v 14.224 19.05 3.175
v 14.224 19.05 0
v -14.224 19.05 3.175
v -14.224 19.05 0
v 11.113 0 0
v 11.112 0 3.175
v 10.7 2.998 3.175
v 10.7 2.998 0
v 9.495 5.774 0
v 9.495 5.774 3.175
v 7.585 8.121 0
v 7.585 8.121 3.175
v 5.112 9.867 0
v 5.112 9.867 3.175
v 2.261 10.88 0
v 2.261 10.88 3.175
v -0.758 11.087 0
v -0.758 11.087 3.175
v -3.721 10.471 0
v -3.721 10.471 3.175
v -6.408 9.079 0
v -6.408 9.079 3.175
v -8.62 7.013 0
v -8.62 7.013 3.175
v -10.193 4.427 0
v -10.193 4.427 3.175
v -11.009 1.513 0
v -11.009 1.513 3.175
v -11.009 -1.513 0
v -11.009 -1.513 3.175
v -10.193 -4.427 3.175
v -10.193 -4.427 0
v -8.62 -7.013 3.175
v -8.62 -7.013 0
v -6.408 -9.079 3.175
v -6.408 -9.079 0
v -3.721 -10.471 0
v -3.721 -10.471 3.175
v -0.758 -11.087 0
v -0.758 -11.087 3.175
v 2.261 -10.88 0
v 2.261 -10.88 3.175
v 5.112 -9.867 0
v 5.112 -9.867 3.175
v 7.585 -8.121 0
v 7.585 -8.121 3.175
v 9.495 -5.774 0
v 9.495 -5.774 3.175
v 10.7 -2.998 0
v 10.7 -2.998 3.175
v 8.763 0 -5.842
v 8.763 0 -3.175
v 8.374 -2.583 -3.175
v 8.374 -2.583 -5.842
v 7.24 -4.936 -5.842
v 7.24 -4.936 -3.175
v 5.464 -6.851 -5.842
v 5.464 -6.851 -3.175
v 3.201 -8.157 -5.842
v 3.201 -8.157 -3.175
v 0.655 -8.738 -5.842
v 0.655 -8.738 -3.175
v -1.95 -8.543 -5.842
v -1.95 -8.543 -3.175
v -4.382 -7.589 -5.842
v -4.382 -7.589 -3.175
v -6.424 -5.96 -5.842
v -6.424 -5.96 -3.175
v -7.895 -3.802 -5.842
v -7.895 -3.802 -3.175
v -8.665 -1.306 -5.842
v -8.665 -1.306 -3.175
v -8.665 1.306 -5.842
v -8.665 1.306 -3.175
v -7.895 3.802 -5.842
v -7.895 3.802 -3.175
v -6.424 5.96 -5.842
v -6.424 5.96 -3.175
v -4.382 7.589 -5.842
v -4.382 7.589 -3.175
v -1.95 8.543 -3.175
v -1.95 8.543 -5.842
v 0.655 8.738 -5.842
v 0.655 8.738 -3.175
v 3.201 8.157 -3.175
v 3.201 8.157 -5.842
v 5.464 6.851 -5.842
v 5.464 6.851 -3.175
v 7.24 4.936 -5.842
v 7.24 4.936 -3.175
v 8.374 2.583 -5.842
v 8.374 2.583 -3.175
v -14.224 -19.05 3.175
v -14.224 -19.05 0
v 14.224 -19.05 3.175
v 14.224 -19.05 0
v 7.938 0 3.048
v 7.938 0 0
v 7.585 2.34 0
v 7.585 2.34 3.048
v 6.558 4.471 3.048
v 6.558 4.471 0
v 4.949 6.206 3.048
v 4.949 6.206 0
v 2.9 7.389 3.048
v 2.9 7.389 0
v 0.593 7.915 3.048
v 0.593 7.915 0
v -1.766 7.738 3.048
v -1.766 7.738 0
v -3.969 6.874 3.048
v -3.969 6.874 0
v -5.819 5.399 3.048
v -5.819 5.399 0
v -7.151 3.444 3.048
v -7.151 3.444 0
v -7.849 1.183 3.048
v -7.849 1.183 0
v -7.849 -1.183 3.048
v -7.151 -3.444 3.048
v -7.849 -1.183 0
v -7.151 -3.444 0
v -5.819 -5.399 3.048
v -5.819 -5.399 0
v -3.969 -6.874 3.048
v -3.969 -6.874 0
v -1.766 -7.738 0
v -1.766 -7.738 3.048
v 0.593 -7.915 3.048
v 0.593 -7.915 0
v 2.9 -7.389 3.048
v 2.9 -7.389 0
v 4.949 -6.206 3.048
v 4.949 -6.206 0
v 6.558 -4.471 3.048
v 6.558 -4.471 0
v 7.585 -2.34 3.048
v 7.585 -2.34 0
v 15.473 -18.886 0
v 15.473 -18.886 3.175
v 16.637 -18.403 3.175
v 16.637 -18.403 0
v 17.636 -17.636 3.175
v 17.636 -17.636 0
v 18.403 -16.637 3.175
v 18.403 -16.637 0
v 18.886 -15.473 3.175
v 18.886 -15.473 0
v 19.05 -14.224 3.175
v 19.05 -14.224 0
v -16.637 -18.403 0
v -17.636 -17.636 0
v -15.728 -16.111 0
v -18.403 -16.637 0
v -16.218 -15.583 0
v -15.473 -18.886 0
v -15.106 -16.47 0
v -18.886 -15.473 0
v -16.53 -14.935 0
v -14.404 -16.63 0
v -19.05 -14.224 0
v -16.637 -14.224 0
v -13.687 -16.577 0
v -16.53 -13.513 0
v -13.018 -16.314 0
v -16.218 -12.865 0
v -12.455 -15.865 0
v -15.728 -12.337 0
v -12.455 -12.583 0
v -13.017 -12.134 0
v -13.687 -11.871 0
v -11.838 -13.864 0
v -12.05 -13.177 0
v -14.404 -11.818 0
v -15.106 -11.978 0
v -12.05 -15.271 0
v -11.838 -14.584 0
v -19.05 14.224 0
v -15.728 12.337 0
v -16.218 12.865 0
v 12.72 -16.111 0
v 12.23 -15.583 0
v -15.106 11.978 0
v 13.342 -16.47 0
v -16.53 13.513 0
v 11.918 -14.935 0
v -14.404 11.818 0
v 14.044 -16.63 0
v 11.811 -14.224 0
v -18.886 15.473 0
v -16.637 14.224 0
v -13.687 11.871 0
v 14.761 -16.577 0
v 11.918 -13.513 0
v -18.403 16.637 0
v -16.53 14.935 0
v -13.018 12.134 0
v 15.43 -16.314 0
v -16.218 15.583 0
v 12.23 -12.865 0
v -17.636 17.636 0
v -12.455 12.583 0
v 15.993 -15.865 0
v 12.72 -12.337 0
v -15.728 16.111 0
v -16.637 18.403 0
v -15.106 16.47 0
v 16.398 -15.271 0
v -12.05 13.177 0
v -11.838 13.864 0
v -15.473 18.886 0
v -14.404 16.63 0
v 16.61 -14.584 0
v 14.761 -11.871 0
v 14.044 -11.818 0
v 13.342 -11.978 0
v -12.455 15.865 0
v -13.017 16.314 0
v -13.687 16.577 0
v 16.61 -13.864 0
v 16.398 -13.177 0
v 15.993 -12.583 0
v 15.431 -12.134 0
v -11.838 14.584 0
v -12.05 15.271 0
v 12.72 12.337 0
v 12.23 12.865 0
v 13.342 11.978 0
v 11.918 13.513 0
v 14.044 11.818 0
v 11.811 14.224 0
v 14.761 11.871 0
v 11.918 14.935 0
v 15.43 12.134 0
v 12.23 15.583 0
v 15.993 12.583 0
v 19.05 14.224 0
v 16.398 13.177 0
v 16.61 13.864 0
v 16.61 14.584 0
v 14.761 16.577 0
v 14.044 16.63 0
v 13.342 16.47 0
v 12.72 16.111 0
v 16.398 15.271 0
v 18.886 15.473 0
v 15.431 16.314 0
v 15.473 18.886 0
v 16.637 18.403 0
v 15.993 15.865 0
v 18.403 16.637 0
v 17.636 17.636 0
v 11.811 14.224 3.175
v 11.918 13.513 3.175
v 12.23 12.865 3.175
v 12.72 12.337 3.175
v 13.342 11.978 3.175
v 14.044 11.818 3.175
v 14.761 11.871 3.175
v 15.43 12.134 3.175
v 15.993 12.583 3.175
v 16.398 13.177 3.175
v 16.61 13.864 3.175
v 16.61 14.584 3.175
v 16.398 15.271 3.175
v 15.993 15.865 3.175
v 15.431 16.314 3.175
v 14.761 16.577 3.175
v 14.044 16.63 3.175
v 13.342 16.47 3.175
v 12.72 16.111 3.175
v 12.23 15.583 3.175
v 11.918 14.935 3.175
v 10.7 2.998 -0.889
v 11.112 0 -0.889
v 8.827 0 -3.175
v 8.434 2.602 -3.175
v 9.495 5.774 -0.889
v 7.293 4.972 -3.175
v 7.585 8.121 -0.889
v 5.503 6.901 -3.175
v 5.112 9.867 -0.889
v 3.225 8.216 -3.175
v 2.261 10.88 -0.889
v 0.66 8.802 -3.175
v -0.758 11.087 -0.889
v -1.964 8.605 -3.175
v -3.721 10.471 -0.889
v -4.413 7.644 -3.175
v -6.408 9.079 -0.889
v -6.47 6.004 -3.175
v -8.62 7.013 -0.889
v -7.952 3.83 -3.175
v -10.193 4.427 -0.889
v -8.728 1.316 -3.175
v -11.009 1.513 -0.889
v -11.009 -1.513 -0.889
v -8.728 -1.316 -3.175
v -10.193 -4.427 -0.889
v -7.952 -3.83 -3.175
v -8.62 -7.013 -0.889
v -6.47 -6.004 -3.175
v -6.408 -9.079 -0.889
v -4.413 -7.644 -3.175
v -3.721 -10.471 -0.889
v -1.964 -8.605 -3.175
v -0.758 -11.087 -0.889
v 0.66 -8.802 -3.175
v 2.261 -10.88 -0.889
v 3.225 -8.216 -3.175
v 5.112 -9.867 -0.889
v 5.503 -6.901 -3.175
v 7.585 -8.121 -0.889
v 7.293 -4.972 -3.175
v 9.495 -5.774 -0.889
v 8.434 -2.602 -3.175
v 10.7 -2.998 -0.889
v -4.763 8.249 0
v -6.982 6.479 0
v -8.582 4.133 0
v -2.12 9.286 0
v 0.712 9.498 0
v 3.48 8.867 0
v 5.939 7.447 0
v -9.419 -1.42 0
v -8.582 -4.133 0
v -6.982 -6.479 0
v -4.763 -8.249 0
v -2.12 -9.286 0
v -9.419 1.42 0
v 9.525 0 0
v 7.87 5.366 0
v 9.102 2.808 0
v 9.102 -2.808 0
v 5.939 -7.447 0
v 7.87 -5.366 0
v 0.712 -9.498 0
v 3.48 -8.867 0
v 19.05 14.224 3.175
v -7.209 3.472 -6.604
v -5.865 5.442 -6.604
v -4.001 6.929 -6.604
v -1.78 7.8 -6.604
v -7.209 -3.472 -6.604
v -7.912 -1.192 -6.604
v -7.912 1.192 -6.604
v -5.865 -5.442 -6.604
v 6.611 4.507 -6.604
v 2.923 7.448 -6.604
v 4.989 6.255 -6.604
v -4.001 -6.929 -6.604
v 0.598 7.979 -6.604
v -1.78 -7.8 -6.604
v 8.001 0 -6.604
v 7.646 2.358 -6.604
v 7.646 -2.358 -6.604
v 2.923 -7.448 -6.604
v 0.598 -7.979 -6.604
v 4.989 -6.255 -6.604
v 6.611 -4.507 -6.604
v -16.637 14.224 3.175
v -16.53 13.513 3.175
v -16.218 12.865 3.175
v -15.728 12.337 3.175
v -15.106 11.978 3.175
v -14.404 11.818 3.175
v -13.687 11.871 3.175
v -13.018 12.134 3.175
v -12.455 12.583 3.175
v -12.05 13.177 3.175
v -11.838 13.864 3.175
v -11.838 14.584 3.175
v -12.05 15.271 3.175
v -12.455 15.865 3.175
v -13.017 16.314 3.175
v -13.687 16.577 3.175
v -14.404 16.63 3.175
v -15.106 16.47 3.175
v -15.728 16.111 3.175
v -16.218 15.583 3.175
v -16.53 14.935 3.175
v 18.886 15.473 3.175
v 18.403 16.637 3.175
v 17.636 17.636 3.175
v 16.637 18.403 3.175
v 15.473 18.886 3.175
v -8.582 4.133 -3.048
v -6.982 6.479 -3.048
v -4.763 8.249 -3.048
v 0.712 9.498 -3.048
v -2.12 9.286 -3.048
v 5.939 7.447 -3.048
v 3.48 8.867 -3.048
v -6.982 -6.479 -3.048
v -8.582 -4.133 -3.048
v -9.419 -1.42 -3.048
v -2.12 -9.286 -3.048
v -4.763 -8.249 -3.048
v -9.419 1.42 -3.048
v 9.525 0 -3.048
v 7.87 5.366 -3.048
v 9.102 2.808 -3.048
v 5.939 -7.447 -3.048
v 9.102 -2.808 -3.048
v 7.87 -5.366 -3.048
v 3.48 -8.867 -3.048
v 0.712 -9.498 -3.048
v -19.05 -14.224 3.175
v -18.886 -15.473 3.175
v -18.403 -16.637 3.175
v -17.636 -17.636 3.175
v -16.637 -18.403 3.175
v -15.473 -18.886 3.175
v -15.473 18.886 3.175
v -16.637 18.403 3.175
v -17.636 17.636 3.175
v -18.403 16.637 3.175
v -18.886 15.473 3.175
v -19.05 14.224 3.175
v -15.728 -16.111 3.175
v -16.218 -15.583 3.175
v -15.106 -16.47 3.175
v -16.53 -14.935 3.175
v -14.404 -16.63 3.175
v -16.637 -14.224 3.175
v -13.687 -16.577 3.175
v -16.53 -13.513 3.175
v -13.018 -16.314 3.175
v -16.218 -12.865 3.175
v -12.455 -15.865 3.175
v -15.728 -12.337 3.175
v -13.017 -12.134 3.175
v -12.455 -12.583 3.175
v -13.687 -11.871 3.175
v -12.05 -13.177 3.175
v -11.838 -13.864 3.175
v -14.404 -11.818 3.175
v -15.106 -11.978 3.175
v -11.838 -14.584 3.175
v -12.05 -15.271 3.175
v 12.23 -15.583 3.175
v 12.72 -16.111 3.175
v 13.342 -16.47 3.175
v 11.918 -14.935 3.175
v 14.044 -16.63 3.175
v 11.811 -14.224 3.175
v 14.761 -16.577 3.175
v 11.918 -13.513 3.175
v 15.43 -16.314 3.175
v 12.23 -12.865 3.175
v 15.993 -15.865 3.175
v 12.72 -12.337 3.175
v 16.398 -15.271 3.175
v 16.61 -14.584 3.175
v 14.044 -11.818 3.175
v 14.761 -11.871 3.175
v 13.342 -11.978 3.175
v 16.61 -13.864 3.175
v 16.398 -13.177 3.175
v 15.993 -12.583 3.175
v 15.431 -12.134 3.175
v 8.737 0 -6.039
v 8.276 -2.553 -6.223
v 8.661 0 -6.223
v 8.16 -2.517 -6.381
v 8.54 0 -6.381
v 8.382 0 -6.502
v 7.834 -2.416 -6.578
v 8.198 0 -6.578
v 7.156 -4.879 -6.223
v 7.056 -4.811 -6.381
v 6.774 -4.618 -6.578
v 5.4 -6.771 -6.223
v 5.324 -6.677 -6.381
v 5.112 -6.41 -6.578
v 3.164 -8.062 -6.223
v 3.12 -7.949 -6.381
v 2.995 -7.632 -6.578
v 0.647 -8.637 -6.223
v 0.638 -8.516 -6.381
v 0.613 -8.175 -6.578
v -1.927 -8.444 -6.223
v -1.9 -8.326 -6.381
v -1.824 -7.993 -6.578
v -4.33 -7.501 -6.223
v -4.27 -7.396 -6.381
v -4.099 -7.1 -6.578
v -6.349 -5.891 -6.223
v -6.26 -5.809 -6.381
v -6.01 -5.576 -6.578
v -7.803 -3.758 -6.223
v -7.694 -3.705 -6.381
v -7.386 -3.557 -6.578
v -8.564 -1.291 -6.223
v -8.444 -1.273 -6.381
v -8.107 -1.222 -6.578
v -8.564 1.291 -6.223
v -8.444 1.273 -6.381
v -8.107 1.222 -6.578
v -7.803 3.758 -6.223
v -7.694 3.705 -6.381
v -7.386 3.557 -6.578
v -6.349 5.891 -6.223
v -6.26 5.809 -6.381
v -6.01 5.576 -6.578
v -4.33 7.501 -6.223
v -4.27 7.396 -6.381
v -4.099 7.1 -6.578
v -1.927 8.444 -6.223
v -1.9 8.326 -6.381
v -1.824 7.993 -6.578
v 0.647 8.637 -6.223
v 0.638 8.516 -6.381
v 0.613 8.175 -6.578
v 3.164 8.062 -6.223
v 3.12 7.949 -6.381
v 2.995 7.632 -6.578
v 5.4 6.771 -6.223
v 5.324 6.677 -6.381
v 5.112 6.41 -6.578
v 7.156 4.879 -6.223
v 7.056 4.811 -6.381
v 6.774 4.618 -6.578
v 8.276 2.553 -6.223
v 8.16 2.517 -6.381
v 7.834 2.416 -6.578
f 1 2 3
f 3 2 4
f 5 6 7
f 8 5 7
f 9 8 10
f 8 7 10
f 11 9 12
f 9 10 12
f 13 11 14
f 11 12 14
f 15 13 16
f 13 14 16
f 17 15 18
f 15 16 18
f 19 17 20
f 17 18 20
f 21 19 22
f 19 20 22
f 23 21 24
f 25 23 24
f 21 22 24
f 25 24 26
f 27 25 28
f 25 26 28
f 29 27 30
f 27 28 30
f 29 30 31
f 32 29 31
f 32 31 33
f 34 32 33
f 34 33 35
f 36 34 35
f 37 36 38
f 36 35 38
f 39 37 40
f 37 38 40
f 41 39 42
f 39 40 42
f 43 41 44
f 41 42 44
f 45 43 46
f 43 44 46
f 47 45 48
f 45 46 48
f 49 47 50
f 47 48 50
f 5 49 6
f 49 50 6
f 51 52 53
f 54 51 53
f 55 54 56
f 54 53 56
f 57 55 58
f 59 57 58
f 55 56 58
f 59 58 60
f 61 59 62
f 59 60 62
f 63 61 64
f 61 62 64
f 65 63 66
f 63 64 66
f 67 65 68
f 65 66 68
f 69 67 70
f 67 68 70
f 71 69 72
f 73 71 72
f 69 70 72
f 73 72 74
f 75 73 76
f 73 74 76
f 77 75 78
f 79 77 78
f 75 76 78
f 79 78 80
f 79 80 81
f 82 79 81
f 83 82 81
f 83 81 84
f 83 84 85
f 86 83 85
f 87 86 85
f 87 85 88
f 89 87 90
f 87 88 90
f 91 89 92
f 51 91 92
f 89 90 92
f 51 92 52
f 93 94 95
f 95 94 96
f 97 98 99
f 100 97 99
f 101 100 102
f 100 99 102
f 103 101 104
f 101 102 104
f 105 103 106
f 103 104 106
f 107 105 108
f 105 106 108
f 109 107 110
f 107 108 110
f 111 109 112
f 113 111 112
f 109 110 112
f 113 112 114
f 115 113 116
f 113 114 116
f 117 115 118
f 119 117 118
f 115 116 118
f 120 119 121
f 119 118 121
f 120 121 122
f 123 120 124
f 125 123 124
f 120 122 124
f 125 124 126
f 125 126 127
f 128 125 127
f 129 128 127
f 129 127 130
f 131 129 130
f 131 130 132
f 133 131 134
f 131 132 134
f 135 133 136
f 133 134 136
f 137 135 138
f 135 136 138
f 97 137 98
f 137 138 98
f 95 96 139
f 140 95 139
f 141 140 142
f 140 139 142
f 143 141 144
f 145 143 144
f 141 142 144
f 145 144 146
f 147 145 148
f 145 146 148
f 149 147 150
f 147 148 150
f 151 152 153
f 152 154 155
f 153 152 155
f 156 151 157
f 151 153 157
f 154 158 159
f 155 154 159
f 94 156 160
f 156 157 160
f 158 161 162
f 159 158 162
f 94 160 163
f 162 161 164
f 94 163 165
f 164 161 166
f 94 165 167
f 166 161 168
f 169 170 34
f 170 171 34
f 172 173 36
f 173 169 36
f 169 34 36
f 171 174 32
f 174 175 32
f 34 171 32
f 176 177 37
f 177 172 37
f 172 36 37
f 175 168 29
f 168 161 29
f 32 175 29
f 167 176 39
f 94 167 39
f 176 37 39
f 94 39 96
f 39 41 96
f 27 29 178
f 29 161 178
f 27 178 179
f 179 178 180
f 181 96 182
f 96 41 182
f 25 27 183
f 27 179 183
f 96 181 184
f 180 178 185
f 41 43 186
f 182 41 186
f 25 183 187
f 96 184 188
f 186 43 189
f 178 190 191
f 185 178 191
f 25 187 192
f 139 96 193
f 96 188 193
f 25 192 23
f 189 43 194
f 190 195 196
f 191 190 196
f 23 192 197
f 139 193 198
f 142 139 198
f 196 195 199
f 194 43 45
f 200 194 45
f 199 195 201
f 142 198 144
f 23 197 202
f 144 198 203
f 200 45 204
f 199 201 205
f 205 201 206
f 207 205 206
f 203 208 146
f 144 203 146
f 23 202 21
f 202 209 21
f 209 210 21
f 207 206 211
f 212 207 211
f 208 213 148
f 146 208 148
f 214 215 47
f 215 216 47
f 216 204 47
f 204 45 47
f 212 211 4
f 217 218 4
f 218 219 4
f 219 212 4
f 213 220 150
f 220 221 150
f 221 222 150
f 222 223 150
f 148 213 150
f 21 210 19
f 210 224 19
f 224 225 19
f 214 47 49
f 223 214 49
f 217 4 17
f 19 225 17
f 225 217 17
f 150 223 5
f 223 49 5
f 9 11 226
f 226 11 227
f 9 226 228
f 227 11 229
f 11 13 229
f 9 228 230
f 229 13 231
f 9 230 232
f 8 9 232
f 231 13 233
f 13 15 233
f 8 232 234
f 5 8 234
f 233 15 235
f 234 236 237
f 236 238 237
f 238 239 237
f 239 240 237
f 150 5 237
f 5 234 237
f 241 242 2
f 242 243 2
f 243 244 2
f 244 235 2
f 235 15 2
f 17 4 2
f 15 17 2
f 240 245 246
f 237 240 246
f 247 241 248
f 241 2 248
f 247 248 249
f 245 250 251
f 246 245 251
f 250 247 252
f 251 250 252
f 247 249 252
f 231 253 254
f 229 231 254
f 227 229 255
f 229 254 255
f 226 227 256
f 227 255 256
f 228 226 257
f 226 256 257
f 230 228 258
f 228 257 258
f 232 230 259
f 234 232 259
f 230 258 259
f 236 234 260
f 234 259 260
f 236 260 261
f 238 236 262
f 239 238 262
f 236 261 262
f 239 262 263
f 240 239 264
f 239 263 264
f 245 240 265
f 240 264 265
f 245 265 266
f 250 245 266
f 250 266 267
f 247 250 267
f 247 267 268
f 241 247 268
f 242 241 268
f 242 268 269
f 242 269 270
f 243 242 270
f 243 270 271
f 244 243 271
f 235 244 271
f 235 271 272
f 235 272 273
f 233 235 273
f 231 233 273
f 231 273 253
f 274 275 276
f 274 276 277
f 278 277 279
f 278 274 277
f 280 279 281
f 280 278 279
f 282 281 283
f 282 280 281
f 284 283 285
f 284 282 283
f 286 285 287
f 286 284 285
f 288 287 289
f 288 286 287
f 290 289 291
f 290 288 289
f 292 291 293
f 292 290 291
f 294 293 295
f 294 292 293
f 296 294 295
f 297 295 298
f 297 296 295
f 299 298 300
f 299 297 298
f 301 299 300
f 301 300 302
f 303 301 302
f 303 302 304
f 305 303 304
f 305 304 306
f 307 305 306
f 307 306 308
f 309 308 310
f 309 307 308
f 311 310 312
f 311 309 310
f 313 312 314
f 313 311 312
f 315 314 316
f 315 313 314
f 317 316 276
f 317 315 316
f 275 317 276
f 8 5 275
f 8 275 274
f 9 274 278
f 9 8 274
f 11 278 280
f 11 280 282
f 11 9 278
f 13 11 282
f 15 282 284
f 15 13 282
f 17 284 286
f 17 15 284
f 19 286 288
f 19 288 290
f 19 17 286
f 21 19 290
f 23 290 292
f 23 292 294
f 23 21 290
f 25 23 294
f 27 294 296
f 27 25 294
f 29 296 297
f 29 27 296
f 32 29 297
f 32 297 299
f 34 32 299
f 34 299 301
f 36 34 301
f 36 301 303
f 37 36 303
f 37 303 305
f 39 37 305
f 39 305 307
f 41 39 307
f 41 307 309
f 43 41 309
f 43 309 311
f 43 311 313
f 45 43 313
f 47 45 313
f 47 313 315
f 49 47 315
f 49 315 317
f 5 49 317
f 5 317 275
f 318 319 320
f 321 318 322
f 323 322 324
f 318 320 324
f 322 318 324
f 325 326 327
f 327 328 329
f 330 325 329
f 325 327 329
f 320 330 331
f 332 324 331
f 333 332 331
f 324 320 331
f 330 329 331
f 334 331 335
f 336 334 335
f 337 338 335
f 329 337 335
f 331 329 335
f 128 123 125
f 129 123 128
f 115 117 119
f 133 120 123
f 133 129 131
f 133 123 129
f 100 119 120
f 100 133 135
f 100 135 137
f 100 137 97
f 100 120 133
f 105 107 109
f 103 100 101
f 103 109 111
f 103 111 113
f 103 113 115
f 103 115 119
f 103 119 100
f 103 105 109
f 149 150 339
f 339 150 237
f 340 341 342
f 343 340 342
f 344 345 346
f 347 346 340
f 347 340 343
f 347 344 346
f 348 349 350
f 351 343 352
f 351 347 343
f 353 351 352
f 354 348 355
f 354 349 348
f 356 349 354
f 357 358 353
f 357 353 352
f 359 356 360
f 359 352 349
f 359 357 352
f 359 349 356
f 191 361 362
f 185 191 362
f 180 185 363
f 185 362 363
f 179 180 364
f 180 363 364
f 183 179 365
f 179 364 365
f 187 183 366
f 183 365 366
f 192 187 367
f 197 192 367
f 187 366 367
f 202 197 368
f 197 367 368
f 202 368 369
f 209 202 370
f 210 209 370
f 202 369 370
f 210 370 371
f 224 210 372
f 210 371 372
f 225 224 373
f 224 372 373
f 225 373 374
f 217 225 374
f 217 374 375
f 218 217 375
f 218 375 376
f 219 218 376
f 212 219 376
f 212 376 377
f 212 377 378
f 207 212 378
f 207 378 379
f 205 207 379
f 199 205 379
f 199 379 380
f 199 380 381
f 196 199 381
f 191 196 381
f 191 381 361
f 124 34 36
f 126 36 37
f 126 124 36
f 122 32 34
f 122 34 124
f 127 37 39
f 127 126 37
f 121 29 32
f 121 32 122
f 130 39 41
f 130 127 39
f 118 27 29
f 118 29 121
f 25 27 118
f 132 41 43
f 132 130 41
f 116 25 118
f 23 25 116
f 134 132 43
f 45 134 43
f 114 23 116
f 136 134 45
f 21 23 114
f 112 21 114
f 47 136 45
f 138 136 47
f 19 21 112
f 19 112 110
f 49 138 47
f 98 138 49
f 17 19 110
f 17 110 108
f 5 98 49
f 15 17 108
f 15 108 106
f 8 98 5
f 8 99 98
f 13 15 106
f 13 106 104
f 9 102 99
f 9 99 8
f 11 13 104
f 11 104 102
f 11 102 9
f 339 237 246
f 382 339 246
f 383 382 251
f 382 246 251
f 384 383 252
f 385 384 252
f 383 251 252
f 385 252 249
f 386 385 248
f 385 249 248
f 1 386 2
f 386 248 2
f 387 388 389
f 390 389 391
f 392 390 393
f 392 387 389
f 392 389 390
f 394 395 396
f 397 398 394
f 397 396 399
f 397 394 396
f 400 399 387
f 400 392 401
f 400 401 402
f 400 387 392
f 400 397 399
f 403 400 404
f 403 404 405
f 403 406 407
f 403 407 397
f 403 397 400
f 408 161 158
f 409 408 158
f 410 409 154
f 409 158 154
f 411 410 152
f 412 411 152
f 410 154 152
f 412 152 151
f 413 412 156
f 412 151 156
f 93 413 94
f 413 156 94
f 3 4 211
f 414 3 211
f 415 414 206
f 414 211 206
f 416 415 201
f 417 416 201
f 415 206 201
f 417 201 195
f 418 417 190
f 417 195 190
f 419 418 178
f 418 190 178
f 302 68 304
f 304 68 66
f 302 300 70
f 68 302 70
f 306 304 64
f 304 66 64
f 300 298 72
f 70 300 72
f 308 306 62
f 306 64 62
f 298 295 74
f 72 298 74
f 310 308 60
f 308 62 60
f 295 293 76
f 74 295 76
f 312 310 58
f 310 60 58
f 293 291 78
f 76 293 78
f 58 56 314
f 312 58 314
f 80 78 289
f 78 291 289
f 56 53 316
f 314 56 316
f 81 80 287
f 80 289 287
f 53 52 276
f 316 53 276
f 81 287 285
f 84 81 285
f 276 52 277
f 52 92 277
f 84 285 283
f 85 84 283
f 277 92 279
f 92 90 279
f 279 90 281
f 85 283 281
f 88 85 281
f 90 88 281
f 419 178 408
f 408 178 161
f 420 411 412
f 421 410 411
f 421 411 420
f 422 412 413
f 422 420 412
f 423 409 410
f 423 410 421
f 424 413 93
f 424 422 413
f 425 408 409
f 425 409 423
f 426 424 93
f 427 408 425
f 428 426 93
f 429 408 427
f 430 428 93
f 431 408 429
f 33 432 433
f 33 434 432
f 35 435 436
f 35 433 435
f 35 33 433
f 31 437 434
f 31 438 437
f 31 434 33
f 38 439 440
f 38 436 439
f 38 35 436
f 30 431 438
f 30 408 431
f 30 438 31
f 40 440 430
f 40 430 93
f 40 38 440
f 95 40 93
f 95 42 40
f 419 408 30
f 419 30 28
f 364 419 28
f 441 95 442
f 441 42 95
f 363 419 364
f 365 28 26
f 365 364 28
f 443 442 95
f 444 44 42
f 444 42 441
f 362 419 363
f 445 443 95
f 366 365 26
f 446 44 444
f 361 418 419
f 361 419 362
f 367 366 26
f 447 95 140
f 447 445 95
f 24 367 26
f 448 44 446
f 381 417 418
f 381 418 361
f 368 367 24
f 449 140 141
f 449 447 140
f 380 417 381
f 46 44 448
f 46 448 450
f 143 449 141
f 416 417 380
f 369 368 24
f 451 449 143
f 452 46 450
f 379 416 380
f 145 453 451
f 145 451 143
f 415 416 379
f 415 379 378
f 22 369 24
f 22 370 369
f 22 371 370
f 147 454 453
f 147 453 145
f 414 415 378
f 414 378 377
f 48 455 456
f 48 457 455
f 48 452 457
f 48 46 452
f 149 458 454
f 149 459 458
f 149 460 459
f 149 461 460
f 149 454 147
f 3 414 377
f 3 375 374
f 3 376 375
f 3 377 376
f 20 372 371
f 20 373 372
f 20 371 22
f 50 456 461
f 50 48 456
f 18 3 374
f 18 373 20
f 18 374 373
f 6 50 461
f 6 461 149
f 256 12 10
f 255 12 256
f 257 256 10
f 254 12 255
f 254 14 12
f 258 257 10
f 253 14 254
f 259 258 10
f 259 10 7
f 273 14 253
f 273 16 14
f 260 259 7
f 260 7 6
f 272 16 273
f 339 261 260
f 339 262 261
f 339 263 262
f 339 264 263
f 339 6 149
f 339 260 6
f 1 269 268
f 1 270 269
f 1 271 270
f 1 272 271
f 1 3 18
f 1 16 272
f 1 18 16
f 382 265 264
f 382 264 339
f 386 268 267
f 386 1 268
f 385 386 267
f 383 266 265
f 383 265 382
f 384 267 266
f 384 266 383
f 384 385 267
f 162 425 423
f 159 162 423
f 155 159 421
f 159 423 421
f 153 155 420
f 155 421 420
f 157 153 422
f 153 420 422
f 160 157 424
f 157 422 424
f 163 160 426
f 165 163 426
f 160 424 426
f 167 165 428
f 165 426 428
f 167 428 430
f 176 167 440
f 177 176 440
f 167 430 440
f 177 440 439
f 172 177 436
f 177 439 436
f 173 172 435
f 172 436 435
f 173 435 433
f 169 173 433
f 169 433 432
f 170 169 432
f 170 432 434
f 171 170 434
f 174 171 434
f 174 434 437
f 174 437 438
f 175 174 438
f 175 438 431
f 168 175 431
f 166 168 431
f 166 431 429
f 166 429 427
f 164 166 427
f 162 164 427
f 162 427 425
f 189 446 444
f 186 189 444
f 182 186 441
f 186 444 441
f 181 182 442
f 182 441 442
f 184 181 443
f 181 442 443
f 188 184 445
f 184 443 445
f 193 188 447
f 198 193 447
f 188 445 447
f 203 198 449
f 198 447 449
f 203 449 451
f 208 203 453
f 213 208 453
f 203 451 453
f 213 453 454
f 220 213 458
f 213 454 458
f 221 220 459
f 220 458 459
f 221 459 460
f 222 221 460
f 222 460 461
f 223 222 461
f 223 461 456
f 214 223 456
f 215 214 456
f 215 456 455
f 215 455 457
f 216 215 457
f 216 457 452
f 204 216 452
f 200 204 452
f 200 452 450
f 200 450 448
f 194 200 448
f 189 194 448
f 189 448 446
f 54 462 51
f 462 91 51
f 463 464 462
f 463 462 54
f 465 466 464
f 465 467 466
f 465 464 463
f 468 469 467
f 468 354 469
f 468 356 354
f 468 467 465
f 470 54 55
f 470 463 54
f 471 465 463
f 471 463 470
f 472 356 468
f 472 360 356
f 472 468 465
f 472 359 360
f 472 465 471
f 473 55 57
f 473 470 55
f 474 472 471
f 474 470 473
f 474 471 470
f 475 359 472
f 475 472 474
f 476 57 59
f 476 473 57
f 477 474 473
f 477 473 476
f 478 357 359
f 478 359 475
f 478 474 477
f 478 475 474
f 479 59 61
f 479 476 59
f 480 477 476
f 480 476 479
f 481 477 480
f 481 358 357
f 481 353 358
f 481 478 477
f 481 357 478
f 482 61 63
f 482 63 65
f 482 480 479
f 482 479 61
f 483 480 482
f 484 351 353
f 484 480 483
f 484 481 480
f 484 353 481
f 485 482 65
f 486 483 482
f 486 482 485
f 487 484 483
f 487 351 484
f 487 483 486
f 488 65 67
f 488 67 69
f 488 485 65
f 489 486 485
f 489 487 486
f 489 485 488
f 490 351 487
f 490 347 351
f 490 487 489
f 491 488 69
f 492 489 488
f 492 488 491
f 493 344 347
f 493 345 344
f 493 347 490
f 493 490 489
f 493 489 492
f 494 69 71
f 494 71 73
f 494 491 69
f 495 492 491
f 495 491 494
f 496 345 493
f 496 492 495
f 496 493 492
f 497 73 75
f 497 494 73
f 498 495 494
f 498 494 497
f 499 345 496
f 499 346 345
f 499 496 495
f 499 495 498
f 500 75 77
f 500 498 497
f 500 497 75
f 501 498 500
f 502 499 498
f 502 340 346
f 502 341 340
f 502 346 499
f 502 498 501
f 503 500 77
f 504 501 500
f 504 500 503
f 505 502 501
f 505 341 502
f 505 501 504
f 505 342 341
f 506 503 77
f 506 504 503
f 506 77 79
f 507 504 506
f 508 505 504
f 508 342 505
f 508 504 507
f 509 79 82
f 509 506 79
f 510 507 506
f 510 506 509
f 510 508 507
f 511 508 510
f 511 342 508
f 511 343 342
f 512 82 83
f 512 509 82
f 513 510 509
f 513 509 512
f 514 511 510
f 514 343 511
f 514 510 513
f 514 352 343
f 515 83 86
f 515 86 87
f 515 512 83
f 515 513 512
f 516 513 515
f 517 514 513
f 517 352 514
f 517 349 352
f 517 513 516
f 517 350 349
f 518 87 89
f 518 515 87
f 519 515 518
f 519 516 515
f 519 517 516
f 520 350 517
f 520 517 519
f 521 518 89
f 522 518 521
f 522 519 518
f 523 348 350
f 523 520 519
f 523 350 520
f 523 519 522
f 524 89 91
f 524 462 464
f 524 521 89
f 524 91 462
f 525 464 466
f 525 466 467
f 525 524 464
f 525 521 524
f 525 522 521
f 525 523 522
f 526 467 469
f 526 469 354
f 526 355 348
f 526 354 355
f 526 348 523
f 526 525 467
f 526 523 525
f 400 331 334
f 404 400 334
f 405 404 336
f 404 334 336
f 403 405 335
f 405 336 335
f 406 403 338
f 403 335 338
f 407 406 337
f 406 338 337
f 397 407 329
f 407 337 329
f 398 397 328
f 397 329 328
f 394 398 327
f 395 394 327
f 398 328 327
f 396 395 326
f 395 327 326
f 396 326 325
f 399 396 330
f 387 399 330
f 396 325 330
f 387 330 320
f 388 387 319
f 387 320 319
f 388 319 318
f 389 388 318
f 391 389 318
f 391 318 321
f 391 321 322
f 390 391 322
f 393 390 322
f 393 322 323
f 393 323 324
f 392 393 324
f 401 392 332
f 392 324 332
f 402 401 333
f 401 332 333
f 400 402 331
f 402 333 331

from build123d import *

# Parameters (mm, degrees)
F1_DEPTH  = 3.175
F2_R      = 11.1125
F3_DEPTH  = 6.35
F4_R      = 11.1125
F5_DEPTH  = 3.175
F6_R      = 9.525
F7_DEPTH  = 3.048
F8_R      = 7.9375
F9_DEPTH  = 3.048
F10_R     = 8.763
F11_DEPTH = 3.429
F12_R     = 0.762
F13_SIZE  = 2.286
F14_D     = 4.826


with BuildPart() as f1:
    # F0 (on Top) → F1 (new body)
    with BuildSketch(Plane.XY):
        with BuildLine():
            ThreePointArc((19.05, 14.224), (17.636497326, 17.636497326), (14.224, 19.05))
            Line((14.224, 19.05), (9.398, 19.05))
            Line((9.398, 19.05), (-14.224, 19.05))
            ThreePointArc((-14.224, 19.05), (-17.636497326, 17.636497326), (-19.05, 14.224))
            Line((-19.05, 14.224), (-19.05, 9.398))
            Line((-19.05, 9.398), (-19.05, -14.224))
            ThreePointArc((-19.05, -14.224), (-17.636497326, -17.636497326), (-14.224, -19.05))
            Line((-14.224, -19.05), (-9.398, -19.05))
            Line((-9.398, -19.05), (9.398, -19.05))
            Line((9.398, -19.05), (14.224, -19.05))
            ThreePointArc((14.224, -19.05), (17.636497326, -17.636497326), (19.05, -14.224))
            Line((19.05, -14.224), (19.05, 14.224))
        make_face()
    extrude(amount=F1_DEPTH)

    # F2 (on face) → F3 (join)
    with BuildSketch(Plane.XY.offset(3.175)):
        Circle(F2_R)
    extrude(amount=-F3_DEPTH)

    # F4 (on face) → F5 (cut)
    with BuildSketch(Plane.XY.offset(3.175)):
        Circle(F4_R)
    extrude(amount=-F5_DEPTH, mode=Mode.SUBTRACT)

    # F8 (on face) → F9 (join)
    with BuildSketch(Plane.XY):
        Circle(F8_R)
    extrude(amount=F9_DEPTH)

    # F10 (on face) → F11 (join)
    with BuildSketch(Plane(origin=(0, 0, -3.175), x_dir=(1, 0, 0), z_dir=(0, 0, -1))):
        Circle(F10_R)
    extrude(amount=F11_DEPTH)

    # F12
    f12_edges = [f1.edges().sort_by_distance(p)[0] for p in [
        (-8.763, 0, -6.604),
    ]]
    fillet(f12_edges, radius=F12_R)

    # F13
    f13_edges = [f1.edges().sort_by_distance(p)[0] for p in [
        (-11.1125, 0, -3.175),
    ]]
    chamfer(f13_edges, length=F13_SIZE)

    # F14 (through all)
    with Locations(Plane(origin=(0, 0, 0), x_dir=(1, 0, 0), z_dir=(0, 0, -1))):
        with Locations((14.224, 14.224), (-14.224, 14.224), (-14.224, -14.224), (14.224, -14.224)):
            Hole(F14_D / 2)


with BuildPart() as f7:
    # F6 (on face) → F7 (new body)
    with BuildSketch(Plane(origin=(0, 0, 0), x_dir=(1, 0, 0), z_dir=(0, 0, -1))):
        Circle(F6_R)
    extrude(amount=F7_DEPTH)


solid = Compound([f1.part, f7.part])
